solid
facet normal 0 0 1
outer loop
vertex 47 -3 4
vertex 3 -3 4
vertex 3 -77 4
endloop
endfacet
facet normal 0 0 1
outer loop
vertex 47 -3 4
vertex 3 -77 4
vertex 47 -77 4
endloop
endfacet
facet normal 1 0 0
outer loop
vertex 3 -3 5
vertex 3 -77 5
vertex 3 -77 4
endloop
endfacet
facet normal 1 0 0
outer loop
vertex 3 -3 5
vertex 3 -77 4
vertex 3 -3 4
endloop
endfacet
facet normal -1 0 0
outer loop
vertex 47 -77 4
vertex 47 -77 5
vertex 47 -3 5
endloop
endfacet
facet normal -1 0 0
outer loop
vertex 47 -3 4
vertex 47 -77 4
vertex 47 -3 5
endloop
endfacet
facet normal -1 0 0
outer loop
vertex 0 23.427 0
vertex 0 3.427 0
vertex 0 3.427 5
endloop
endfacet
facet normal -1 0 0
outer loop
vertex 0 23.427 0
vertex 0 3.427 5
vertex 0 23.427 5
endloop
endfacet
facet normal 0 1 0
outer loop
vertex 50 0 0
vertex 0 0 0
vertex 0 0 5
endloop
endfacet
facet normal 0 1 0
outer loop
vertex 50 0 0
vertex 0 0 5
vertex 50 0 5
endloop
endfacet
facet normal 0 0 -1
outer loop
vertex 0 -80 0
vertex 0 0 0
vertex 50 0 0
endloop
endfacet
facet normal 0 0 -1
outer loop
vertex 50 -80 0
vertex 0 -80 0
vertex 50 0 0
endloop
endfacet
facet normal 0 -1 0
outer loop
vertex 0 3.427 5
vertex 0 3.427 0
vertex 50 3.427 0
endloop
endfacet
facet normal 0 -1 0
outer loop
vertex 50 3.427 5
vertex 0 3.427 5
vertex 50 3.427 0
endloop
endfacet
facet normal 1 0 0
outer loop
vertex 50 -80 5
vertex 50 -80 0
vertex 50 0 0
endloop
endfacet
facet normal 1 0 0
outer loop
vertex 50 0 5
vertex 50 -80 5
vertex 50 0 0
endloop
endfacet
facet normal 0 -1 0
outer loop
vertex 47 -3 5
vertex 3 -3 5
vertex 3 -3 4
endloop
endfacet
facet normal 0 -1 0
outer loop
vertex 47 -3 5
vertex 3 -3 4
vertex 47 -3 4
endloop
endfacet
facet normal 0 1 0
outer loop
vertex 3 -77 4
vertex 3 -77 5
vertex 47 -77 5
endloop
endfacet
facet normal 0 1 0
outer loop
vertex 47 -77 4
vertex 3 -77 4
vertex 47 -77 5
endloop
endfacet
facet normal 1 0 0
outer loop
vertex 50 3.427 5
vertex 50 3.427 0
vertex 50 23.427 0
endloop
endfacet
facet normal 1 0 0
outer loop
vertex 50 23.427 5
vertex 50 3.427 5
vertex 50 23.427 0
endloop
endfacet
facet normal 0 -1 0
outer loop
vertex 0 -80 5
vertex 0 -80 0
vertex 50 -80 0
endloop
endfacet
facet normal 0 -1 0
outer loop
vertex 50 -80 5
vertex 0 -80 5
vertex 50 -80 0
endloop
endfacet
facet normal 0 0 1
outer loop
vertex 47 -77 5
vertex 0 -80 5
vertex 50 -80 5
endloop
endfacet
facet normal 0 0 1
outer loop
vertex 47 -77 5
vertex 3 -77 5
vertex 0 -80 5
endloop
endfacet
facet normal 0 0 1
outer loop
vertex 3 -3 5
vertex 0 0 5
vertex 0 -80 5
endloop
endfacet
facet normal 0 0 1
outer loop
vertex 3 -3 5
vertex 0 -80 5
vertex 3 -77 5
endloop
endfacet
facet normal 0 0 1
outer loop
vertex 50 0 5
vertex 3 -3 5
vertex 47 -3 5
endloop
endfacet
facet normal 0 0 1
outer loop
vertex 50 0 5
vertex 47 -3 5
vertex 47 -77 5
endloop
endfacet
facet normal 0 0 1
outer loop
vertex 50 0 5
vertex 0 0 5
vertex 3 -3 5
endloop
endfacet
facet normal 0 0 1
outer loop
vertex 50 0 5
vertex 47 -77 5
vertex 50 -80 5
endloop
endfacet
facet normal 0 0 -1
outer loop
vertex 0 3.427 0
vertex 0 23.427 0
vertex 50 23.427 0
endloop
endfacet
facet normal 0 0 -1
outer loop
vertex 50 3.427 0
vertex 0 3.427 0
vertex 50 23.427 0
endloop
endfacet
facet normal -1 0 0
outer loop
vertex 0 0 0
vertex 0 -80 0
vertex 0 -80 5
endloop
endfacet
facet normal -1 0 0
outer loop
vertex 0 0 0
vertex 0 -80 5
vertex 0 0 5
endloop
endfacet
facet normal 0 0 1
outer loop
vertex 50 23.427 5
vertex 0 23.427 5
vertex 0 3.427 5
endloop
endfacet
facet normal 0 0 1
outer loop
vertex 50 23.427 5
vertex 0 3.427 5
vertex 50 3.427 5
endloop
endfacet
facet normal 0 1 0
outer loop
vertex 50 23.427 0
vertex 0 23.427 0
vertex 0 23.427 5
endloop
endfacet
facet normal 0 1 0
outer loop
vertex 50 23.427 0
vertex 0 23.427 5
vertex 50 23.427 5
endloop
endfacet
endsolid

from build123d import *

# Parameters (mm, degrees)
F0_W     = 50
F0_H     = 80
F2_DEPTH = 5
F1_W     = 50
F1_H     = 20
F3_DEPTH = 5
F4_W     = 44
F4_H     = 74
F5_DEPTH = 1


with BuildPart() as f2:
    # F0 (on Top) → F2 (new body)
    with BuildSketch(Plane.XY):
        with Locations((25, -40)):
            Rectangle(F0_W, F0_H)
    extrude(amount=F2_DEPTH)

    # F4 (on face) → F5 (cut)
    with BuildSketch(Plane.XY.offset(5)):
        with Locations((25, -40)):
            Rectangle(F4_W, F4_H)
    extrude(amount=-F5_DEPTH, mode=Mode.SUBTRACT)


with BuildPart() as f3:
    # F1 (on Top) → F3 (new body)
    with BuildSketch(Plane.XY):
        with Locations((25, 13.426736)):
            Rectangle(F1_W, F1_H)
    extrude(amount=F3_DEPTH)


solid = Compound([f2.part, f3.part])
